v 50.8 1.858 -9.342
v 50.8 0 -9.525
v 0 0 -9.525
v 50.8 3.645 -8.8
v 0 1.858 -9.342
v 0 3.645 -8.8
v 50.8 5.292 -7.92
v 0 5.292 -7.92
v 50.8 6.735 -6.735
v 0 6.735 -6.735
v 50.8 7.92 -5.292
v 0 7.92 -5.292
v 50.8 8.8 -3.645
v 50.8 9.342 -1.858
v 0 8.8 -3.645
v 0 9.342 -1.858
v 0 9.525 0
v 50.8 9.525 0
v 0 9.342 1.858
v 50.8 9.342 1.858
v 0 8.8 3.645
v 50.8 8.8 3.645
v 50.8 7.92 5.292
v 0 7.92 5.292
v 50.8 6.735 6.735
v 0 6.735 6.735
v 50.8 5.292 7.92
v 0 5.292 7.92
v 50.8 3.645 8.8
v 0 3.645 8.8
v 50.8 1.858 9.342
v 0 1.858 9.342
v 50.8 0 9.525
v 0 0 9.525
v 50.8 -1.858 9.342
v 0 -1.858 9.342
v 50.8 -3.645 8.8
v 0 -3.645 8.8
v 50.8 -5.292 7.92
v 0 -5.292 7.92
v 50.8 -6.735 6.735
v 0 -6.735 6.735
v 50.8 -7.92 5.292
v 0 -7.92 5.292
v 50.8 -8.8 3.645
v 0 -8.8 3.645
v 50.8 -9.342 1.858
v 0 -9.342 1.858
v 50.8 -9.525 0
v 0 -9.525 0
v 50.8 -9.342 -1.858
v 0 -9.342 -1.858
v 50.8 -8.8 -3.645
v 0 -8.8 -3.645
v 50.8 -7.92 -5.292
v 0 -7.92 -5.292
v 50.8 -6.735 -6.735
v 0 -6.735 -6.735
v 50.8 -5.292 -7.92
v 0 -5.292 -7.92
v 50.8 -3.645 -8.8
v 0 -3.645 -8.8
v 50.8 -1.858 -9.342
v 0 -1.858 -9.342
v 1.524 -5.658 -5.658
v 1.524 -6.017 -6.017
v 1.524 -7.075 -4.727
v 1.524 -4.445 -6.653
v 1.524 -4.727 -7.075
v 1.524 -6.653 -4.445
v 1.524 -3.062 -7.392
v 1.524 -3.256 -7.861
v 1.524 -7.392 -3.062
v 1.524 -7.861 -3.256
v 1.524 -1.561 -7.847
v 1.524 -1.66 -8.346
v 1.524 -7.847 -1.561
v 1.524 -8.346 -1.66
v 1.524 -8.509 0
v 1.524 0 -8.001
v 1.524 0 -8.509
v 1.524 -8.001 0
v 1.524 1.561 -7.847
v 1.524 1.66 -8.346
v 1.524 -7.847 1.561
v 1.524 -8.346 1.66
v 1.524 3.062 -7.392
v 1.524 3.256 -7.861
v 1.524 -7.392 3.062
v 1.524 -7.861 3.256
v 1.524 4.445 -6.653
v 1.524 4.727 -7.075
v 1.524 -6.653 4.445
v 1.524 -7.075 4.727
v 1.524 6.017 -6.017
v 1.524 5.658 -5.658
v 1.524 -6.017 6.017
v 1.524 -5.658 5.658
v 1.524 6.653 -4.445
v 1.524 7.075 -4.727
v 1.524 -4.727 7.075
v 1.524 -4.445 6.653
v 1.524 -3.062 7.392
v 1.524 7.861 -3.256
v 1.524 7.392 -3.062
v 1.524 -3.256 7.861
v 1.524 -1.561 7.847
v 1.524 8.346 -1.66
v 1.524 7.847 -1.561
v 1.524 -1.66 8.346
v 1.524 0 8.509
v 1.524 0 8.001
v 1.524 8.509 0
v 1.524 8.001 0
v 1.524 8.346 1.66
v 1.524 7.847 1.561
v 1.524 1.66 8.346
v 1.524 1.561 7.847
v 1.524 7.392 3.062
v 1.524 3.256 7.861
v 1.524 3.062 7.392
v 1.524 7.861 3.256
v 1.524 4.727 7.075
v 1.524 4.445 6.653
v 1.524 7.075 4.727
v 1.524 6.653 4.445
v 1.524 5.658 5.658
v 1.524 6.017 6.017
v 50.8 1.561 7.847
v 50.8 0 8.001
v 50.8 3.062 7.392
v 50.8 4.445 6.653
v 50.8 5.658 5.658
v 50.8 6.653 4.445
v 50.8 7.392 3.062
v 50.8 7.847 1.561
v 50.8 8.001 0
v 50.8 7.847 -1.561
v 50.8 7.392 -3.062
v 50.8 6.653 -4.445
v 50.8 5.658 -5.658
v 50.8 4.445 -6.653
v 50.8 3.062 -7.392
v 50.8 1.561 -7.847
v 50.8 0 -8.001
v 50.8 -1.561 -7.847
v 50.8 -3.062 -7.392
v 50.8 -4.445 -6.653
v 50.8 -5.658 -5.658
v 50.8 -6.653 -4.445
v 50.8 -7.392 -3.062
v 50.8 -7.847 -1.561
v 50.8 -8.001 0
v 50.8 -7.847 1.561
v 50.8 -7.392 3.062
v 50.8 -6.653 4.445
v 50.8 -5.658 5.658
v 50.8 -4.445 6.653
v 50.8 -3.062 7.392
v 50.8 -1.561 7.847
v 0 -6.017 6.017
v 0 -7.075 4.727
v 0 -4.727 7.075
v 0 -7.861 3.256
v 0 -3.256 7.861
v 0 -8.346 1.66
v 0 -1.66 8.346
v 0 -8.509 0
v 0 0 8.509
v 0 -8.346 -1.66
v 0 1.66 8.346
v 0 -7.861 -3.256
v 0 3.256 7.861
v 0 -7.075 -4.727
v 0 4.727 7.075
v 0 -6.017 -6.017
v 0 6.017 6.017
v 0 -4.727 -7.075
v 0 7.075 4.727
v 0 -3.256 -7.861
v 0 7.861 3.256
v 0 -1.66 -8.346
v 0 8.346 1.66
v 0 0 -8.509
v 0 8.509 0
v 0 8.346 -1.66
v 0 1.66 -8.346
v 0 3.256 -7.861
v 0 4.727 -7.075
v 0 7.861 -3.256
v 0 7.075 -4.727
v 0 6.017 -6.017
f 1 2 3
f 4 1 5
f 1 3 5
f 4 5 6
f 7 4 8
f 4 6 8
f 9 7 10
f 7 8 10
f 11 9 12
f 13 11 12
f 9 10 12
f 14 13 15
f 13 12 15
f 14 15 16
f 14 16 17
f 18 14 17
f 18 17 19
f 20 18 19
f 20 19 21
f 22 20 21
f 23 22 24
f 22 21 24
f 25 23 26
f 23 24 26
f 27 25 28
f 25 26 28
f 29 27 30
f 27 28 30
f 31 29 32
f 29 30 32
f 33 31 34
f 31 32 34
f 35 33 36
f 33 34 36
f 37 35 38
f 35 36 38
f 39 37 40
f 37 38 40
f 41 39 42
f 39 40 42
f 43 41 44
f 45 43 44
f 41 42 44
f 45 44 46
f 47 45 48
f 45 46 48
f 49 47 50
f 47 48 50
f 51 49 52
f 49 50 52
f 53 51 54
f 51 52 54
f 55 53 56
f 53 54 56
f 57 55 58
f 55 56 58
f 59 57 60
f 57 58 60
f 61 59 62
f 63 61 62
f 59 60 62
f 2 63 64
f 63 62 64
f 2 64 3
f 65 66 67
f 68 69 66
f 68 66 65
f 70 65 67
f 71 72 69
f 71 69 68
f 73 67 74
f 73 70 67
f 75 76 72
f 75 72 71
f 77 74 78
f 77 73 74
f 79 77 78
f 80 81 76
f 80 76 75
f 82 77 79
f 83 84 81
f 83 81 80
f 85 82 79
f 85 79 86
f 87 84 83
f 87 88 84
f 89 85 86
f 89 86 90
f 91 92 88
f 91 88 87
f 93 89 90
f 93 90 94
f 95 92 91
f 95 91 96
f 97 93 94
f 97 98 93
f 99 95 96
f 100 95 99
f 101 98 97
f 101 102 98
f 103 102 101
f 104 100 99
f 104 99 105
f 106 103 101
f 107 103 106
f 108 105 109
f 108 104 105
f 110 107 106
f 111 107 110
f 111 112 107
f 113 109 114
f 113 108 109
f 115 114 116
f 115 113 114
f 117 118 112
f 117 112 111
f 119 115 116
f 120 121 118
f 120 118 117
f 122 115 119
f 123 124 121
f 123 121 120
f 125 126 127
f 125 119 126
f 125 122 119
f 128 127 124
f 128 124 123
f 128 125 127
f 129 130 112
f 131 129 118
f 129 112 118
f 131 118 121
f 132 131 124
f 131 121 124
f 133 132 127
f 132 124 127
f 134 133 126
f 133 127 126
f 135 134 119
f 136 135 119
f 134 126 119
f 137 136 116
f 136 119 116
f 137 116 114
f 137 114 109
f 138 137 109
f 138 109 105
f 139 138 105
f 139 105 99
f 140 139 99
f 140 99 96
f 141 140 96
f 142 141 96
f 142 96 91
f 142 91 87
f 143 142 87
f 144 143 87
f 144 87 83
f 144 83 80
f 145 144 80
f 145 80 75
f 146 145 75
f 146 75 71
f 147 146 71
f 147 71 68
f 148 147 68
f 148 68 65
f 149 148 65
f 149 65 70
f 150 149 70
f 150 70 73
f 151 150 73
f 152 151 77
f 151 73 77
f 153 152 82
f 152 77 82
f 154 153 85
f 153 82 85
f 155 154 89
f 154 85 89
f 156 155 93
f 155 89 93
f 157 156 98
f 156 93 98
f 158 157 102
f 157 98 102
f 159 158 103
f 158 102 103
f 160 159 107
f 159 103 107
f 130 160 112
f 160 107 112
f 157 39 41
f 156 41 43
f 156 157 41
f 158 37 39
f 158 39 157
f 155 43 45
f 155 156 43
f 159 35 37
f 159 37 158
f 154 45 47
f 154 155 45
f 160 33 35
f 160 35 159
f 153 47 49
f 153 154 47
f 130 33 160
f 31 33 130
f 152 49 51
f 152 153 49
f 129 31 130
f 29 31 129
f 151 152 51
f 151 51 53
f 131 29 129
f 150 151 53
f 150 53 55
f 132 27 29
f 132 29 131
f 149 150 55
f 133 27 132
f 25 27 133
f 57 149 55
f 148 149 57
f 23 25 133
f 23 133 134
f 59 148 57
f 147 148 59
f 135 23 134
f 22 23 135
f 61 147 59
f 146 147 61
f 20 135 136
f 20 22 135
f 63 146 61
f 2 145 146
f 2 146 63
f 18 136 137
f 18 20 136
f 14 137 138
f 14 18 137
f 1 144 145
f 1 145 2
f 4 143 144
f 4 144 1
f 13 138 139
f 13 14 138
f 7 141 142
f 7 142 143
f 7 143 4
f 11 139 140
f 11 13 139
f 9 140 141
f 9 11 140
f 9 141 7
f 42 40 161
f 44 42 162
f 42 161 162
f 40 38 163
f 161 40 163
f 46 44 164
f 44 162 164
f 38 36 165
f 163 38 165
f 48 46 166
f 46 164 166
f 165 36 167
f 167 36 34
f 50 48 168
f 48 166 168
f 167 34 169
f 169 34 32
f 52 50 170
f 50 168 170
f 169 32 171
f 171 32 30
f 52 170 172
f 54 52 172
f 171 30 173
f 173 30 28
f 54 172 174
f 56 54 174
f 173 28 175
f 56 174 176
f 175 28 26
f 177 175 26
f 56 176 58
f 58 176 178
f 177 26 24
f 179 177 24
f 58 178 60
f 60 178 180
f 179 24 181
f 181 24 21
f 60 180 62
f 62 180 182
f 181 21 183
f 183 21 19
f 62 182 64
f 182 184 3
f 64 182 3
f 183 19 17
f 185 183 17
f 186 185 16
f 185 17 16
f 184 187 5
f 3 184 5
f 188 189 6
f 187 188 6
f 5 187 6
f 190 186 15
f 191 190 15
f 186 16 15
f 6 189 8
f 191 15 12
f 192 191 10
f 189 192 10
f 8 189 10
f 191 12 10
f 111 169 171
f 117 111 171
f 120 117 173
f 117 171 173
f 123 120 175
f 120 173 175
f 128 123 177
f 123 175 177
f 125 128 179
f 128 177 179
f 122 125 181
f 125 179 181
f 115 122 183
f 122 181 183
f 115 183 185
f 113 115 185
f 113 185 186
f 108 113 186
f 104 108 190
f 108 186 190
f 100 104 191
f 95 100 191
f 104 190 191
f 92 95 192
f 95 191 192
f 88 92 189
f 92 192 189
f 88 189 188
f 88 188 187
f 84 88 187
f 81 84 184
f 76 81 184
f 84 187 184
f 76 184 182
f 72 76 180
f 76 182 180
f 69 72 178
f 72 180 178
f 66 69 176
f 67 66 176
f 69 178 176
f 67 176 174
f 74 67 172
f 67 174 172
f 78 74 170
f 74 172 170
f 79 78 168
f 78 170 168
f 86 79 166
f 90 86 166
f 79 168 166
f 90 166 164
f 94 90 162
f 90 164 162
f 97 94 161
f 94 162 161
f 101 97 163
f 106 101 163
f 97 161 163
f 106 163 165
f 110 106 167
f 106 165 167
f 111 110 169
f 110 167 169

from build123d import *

# Parameters (mm, degrees)
SKETCH1_R           = 9.525
BOSS_EXTRUDE1_DEPTH = 50.8
SKETCH3_R           = 8.509
CUT_EXTRUDE1_DEPTH  = 1.524
SKETCH4_R           = 8.001
CUT_EXTRUDE2_DEPTH  = 50.276


with BuildPart() as part:
    # Sketch1 → Boss-Extrude1 (new body)
    with BuildSketch(Plane(origin=(0, 0, 0), x_dir=(0, 0, -1), z_dir=(1, 0, 0))):
        Circle(SKETCH1_R)
    extrude(amount=BOSS_EXTRUDE1_DEPTH)

    # Sketch3 → Cut-Extrude1 (cut)
    with BuildSketch(Plane.ZY):
        Circle(SKETCH3_R)
    extrude(amount=-CUT_EXTRUDE1_DEPTH, mode=Mode.SUBTRACT)

    # Sketch4 → Cut-Extrude2 (cut, through all)
    with BuildSketch(Plane.ZY.offset(-1.524)):
        Circle(SKETCH4_R)
    extrude(amount=-CUT_EXTRUDE2_DEPTH, mode=Mode.SUBTRACT)


solid = part.part
